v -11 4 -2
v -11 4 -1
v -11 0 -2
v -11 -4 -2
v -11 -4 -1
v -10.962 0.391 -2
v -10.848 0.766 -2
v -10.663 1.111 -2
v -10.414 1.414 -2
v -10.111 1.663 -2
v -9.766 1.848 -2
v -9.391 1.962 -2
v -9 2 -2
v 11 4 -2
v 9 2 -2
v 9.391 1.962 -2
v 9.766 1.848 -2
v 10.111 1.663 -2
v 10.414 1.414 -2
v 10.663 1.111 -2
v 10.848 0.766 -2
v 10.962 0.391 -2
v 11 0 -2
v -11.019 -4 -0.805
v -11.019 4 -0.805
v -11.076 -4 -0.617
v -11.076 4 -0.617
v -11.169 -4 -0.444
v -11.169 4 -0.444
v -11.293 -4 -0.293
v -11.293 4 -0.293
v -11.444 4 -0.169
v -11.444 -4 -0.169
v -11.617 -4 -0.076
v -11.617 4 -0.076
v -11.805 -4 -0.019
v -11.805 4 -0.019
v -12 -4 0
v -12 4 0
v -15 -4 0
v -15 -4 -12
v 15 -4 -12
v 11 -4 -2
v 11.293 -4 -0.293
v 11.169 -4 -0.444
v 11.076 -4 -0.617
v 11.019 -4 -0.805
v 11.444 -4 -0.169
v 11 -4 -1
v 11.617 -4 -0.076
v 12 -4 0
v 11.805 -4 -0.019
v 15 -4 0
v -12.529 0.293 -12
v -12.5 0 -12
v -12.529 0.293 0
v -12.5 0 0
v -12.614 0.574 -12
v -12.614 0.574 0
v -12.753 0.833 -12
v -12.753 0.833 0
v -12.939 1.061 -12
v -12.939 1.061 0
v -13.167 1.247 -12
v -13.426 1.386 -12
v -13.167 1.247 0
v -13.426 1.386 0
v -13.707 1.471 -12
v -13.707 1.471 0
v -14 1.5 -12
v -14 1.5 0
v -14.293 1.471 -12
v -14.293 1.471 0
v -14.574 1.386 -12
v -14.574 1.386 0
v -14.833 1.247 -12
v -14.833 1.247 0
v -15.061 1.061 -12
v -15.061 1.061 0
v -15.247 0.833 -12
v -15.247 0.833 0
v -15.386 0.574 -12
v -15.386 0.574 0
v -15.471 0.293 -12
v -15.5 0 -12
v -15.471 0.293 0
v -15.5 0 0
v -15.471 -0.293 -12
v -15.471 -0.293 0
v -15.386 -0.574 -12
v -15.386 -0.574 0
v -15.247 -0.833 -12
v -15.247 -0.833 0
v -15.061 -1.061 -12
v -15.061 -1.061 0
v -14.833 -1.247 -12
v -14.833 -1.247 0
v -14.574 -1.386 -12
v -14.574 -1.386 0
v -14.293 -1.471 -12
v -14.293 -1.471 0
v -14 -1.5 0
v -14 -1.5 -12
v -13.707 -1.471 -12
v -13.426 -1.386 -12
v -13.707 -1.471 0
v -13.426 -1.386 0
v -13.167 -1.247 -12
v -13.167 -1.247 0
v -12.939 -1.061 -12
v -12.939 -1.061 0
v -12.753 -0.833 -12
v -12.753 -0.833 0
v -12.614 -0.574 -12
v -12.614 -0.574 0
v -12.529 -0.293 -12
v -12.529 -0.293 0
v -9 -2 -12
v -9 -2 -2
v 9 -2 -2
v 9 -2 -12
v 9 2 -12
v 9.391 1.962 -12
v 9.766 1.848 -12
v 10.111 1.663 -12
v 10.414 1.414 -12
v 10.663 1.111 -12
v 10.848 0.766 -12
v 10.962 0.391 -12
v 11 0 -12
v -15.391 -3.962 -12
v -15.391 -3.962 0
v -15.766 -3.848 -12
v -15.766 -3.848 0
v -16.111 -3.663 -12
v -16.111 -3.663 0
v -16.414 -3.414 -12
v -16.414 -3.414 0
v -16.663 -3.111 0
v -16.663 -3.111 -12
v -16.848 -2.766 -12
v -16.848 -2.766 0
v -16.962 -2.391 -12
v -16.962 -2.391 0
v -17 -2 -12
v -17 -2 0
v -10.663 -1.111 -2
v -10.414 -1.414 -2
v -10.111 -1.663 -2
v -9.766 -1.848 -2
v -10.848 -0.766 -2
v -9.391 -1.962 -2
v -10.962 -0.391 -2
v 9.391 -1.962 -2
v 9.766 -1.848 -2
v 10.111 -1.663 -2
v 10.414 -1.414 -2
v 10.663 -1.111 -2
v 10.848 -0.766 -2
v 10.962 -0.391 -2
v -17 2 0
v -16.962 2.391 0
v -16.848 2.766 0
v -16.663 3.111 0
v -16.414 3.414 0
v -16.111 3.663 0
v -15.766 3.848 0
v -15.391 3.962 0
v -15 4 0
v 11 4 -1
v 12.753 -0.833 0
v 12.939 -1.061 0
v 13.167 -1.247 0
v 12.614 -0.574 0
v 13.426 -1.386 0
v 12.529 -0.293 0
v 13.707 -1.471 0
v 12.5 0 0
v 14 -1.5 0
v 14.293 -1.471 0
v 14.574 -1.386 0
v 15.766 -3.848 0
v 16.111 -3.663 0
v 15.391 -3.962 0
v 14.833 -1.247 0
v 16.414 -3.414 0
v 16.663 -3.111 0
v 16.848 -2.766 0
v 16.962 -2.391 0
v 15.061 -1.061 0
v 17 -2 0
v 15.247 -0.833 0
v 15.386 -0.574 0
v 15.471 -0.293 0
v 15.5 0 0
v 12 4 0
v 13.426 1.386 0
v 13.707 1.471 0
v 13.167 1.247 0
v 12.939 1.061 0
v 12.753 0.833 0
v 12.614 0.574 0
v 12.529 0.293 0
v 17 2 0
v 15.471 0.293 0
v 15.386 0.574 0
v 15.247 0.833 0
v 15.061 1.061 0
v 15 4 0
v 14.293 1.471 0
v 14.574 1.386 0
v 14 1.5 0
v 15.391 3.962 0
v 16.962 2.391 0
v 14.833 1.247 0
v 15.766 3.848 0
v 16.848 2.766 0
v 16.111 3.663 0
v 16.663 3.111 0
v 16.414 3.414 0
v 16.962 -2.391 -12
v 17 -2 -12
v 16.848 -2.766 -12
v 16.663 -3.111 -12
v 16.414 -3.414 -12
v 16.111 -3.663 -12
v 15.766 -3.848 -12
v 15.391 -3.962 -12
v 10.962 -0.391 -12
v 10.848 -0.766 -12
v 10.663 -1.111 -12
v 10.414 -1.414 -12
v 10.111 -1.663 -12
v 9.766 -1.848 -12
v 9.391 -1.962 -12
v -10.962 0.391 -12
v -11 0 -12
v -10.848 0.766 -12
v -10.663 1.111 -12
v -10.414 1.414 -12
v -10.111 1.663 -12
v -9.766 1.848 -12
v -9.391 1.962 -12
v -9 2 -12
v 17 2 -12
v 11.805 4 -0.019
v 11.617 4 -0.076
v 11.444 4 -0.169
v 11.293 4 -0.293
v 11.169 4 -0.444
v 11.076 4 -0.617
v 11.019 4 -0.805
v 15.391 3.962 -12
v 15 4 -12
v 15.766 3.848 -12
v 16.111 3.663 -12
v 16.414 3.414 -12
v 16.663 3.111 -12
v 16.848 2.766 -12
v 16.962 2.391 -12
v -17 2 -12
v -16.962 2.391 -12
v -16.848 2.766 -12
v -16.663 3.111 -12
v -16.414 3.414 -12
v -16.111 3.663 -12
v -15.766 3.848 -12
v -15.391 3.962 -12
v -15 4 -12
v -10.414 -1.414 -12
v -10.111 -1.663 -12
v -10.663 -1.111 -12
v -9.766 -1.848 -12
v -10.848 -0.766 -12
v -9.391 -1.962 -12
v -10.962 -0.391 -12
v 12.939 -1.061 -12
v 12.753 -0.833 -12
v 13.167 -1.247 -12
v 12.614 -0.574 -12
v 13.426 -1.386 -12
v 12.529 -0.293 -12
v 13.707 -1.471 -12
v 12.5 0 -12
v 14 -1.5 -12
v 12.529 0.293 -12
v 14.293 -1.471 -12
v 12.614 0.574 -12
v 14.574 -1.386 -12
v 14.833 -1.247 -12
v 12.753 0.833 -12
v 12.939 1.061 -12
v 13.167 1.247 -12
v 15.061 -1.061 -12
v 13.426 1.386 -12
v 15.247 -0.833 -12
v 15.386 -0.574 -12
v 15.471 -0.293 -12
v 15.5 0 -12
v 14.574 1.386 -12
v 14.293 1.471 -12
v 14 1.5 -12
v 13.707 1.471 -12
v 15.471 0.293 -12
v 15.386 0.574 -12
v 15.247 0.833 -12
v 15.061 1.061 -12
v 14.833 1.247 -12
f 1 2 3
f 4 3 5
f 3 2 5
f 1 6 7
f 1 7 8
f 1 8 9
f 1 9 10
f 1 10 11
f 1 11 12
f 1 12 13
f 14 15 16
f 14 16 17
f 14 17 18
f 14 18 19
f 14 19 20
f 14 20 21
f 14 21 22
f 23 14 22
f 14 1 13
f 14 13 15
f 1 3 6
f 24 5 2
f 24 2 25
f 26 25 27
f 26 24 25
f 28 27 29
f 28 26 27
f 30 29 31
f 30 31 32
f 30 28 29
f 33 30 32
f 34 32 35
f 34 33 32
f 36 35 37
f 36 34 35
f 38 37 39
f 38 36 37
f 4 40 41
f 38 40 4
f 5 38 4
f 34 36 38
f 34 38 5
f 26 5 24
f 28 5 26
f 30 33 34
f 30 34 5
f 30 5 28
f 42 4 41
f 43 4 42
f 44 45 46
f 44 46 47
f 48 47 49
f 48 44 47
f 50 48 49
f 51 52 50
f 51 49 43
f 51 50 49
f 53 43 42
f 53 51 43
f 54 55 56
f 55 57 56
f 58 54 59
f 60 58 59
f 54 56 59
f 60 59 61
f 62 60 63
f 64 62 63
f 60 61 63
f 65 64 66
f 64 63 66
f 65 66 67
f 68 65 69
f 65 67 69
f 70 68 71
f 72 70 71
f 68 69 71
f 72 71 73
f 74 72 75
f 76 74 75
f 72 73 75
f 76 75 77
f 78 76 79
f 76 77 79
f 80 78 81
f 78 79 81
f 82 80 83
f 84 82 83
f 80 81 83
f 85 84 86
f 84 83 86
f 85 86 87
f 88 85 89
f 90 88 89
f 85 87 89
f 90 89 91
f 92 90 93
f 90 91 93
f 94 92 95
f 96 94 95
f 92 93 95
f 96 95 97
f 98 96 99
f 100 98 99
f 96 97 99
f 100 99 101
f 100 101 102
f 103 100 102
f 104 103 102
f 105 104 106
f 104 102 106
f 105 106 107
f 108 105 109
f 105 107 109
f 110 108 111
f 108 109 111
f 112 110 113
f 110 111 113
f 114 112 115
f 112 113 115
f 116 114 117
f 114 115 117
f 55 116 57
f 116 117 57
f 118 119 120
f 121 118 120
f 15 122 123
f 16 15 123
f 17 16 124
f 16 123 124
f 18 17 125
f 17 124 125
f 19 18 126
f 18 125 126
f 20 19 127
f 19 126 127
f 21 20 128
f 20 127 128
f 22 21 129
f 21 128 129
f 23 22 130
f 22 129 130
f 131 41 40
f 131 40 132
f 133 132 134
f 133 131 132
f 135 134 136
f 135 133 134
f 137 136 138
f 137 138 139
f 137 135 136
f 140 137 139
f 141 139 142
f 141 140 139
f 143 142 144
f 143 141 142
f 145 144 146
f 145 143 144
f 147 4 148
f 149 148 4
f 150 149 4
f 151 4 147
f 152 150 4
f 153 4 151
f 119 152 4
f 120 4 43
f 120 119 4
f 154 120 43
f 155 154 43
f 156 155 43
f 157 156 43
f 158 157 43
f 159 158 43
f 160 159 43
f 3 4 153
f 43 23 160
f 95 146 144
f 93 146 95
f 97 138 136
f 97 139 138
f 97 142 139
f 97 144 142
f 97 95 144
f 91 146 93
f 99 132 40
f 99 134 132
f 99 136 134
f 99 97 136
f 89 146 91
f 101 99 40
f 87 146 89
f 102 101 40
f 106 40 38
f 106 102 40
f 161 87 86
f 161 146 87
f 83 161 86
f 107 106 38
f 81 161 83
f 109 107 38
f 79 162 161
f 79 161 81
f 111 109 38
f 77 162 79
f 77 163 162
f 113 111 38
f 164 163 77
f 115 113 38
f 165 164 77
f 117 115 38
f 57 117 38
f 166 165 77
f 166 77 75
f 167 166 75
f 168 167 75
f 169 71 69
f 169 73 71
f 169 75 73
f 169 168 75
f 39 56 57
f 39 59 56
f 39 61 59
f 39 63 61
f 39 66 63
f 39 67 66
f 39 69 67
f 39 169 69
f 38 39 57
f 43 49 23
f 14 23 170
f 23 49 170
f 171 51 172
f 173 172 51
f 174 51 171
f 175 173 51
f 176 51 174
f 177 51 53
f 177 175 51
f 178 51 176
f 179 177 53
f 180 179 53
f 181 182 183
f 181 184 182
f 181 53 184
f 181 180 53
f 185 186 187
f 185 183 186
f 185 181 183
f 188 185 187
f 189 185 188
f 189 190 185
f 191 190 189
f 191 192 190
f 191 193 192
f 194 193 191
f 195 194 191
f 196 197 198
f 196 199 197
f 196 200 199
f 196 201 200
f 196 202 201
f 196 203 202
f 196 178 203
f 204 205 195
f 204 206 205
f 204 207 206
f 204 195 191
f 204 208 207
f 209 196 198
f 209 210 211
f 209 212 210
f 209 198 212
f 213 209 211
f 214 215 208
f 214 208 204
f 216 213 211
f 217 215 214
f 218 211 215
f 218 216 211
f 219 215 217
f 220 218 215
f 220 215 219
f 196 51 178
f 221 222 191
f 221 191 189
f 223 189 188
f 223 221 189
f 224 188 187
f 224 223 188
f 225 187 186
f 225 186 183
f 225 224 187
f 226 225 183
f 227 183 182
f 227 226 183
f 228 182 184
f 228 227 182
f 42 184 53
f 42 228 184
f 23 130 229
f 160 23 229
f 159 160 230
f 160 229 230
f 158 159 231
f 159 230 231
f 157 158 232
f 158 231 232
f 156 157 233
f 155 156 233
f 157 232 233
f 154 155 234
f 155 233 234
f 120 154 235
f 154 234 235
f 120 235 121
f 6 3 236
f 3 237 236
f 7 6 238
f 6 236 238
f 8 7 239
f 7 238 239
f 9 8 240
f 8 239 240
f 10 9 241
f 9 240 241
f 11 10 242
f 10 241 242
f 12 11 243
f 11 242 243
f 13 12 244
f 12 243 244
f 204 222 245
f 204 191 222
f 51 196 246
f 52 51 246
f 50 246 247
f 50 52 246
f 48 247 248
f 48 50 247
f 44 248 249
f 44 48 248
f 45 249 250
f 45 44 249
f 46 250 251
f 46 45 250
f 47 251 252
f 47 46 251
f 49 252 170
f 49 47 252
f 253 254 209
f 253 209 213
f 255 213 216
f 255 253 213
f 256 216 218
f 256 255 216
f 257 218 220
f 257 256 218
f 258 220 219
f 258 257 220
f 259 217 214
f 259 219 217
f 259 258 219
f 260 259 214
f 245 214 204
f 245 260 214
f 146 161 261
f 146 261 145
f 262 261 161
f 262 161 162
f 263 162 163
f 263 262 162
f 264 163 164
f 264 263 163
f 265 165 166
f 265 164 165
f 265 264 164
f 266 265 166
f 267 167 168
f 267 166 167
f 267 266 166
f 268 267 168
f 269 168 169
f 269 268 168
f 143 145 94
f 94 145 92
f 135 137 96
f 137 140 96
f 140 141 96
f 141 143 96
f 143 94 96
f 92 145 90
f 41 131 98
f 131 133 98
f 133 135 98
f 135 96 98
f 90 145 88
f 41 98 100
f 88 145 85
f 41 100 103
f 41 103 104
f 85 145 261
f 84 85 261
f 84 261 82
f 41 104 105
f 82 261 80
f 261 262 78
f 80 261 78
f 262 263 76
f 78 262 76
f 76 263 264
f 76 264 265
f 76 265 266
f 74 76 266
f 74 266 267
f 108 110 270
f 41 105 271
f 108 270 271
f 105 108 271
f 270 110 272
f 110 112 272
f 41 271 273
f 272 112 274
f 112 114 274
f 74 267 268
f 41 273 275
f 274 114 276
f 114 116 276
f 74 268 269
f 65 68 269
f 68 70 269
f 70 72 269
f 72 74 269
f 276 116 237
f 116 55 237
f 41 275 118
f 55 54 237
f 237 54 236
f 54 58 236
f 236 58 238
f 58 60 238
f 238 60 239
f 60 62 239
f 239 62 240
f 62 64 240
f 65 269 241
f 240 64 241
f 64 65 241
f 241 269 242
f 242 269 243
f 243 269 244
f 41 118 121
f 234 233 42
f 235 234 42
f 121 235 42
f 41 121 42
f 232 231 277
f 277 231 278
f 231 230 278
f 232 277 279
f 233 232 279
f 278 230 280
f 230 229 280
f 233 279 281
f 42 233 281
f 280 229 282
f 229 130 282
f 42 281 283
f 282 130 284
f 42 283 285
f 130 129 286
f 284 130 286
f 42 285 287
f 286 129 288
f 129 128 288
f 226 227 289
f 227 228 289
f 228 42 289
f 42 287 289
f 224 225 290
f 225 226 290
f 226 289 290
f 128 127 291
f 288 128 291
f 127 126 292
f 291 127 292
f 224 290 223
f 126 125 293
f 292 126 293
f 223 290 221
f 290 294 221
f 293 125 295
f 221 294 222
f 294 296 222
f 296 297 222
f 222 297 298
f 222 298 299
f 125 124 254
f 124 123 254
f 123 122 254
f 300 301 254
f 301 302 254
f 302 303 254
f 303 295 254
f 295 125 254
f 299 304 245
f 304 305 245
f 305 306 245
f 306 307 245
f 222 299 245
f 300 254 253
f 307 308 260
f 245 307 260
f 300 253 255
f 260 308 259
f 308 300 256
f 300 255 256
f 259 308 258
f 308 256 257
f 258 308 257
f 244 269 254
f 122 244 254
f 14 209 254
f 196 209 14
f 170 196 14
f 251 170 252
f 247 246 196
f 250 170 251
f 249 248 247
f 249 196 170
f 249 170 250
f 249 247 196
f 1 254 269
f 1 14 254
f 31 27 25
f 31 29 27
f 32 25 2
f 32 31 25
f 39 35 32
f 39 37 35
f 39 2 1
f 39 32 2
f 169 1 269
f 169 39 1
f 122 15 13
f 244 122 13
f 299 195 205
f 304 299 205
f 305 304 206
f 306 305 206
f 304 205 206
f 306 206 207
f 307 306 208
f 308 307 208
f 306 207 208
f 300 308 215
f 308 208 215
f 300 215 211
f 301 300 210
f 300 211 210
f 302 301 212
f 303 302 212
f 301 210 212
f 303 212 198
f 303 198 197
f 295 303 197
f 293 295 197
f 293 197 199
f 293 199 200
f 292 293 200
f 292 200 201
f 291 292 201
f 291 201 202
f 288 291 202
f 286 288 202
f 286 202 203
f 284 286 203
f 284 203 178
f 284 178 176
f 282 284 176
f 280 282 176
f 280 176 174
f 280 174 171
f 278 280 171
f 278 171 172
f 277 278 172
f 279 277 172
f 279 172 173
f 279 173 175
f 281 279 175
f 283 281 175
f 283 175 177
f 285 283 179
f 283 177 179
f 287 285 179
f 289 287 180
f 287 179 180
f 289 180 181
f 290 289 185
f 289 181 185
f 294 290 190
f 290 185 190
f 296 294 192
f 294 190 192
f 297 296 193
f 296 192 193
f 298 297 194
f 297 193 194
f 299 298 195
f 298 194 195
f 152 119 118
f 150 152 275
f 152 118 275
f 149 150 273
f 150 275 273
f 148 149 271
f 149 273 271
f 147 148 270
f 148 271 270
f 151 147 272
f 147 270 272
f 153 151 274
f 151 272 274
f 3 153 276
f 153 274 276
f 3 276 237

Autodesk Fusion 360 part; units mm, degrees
sketch "Sketch1" plane through (0, 0, 0) normal (0, 0, 1) x (1, 0, 0)
  line L0 (17, 4) -> (-17, 4)
  line L1 (-17, 4) -> (-17, -4)
  line L2 (-17, -4) -> (17, -4)
  line L3 (17, -4) -> (17, 4)
  line L4 (17, 4) -> (-17, -4) construction
  line L5 (-17, 4) -> (17, -4) construction
  line L6 (0, 0) -> (14, 0) construction
  circle A0 centre (14, 0) radius 1.5
  line L7 (0, 0) -> (0, 4) construction
  circle A1 centre (-14, 0) radius 1.5
  line L8 (11, 2) -> (-11, 2)
  line L9 (-11, 2) -> (-11, -2)
  line L10 (-11, -2) -> (11, -2)
  line L11 (11, -2) -> (11, 2)
  line L12 (11, 2) -> (-11, -2) construction
  line L13 (-11, 2) -> (11, -2) construction
  line L14 (-11, -4) -> (11, -4)
  line L15 (11, -4) -> (11, 4)
  line L16 (11, 4) -> (-11, 4)
  line L17 (-11, 4) -> (-11, -4)
  line L18 (-11, -4) -> (11, 4) construction
  line L19 (11, -4) -> (-11, 4) construction
  dimension "d44" = 34
  dimension "d45" = 14
  dimension "d46" = 3
  dimension "d47" = 3
  dimension "d48" = 2
  dimension "d49" = 8
  dimension "d54" = 22
extrude "Extrude4" add sketch "Sketch1" against normal blind 12 contours L0 L2 L3 L11 L15 | L0 L8 L15 L16 L17 | L0 L1 L2 L9 L17 | L2 L10 L14 L15 L17
fillet "Fillet5" radius 2 8 edges at (-17, -4, -6) (17, -4, -6) (17, 4, -6) (-17, 4, -6) (-11, 2, -6) (-11, -2, -6) (11, -2, -6) (11, 2, -6)
thread "Thread4"
extrude "Extrude5" cut sketch "Sketch1" against normal blind 2 contours L0 L8 L15 L16 L17 | L8 L9 L10 L11 L15 L17 | L2 L10 L14 L15 L17
fillet "Fillet6" radius 1 2 edges at (-11, 0, 0) (11, 0, 0)
equation "d1 = ( 47 / 2 ) * 1 mm"
